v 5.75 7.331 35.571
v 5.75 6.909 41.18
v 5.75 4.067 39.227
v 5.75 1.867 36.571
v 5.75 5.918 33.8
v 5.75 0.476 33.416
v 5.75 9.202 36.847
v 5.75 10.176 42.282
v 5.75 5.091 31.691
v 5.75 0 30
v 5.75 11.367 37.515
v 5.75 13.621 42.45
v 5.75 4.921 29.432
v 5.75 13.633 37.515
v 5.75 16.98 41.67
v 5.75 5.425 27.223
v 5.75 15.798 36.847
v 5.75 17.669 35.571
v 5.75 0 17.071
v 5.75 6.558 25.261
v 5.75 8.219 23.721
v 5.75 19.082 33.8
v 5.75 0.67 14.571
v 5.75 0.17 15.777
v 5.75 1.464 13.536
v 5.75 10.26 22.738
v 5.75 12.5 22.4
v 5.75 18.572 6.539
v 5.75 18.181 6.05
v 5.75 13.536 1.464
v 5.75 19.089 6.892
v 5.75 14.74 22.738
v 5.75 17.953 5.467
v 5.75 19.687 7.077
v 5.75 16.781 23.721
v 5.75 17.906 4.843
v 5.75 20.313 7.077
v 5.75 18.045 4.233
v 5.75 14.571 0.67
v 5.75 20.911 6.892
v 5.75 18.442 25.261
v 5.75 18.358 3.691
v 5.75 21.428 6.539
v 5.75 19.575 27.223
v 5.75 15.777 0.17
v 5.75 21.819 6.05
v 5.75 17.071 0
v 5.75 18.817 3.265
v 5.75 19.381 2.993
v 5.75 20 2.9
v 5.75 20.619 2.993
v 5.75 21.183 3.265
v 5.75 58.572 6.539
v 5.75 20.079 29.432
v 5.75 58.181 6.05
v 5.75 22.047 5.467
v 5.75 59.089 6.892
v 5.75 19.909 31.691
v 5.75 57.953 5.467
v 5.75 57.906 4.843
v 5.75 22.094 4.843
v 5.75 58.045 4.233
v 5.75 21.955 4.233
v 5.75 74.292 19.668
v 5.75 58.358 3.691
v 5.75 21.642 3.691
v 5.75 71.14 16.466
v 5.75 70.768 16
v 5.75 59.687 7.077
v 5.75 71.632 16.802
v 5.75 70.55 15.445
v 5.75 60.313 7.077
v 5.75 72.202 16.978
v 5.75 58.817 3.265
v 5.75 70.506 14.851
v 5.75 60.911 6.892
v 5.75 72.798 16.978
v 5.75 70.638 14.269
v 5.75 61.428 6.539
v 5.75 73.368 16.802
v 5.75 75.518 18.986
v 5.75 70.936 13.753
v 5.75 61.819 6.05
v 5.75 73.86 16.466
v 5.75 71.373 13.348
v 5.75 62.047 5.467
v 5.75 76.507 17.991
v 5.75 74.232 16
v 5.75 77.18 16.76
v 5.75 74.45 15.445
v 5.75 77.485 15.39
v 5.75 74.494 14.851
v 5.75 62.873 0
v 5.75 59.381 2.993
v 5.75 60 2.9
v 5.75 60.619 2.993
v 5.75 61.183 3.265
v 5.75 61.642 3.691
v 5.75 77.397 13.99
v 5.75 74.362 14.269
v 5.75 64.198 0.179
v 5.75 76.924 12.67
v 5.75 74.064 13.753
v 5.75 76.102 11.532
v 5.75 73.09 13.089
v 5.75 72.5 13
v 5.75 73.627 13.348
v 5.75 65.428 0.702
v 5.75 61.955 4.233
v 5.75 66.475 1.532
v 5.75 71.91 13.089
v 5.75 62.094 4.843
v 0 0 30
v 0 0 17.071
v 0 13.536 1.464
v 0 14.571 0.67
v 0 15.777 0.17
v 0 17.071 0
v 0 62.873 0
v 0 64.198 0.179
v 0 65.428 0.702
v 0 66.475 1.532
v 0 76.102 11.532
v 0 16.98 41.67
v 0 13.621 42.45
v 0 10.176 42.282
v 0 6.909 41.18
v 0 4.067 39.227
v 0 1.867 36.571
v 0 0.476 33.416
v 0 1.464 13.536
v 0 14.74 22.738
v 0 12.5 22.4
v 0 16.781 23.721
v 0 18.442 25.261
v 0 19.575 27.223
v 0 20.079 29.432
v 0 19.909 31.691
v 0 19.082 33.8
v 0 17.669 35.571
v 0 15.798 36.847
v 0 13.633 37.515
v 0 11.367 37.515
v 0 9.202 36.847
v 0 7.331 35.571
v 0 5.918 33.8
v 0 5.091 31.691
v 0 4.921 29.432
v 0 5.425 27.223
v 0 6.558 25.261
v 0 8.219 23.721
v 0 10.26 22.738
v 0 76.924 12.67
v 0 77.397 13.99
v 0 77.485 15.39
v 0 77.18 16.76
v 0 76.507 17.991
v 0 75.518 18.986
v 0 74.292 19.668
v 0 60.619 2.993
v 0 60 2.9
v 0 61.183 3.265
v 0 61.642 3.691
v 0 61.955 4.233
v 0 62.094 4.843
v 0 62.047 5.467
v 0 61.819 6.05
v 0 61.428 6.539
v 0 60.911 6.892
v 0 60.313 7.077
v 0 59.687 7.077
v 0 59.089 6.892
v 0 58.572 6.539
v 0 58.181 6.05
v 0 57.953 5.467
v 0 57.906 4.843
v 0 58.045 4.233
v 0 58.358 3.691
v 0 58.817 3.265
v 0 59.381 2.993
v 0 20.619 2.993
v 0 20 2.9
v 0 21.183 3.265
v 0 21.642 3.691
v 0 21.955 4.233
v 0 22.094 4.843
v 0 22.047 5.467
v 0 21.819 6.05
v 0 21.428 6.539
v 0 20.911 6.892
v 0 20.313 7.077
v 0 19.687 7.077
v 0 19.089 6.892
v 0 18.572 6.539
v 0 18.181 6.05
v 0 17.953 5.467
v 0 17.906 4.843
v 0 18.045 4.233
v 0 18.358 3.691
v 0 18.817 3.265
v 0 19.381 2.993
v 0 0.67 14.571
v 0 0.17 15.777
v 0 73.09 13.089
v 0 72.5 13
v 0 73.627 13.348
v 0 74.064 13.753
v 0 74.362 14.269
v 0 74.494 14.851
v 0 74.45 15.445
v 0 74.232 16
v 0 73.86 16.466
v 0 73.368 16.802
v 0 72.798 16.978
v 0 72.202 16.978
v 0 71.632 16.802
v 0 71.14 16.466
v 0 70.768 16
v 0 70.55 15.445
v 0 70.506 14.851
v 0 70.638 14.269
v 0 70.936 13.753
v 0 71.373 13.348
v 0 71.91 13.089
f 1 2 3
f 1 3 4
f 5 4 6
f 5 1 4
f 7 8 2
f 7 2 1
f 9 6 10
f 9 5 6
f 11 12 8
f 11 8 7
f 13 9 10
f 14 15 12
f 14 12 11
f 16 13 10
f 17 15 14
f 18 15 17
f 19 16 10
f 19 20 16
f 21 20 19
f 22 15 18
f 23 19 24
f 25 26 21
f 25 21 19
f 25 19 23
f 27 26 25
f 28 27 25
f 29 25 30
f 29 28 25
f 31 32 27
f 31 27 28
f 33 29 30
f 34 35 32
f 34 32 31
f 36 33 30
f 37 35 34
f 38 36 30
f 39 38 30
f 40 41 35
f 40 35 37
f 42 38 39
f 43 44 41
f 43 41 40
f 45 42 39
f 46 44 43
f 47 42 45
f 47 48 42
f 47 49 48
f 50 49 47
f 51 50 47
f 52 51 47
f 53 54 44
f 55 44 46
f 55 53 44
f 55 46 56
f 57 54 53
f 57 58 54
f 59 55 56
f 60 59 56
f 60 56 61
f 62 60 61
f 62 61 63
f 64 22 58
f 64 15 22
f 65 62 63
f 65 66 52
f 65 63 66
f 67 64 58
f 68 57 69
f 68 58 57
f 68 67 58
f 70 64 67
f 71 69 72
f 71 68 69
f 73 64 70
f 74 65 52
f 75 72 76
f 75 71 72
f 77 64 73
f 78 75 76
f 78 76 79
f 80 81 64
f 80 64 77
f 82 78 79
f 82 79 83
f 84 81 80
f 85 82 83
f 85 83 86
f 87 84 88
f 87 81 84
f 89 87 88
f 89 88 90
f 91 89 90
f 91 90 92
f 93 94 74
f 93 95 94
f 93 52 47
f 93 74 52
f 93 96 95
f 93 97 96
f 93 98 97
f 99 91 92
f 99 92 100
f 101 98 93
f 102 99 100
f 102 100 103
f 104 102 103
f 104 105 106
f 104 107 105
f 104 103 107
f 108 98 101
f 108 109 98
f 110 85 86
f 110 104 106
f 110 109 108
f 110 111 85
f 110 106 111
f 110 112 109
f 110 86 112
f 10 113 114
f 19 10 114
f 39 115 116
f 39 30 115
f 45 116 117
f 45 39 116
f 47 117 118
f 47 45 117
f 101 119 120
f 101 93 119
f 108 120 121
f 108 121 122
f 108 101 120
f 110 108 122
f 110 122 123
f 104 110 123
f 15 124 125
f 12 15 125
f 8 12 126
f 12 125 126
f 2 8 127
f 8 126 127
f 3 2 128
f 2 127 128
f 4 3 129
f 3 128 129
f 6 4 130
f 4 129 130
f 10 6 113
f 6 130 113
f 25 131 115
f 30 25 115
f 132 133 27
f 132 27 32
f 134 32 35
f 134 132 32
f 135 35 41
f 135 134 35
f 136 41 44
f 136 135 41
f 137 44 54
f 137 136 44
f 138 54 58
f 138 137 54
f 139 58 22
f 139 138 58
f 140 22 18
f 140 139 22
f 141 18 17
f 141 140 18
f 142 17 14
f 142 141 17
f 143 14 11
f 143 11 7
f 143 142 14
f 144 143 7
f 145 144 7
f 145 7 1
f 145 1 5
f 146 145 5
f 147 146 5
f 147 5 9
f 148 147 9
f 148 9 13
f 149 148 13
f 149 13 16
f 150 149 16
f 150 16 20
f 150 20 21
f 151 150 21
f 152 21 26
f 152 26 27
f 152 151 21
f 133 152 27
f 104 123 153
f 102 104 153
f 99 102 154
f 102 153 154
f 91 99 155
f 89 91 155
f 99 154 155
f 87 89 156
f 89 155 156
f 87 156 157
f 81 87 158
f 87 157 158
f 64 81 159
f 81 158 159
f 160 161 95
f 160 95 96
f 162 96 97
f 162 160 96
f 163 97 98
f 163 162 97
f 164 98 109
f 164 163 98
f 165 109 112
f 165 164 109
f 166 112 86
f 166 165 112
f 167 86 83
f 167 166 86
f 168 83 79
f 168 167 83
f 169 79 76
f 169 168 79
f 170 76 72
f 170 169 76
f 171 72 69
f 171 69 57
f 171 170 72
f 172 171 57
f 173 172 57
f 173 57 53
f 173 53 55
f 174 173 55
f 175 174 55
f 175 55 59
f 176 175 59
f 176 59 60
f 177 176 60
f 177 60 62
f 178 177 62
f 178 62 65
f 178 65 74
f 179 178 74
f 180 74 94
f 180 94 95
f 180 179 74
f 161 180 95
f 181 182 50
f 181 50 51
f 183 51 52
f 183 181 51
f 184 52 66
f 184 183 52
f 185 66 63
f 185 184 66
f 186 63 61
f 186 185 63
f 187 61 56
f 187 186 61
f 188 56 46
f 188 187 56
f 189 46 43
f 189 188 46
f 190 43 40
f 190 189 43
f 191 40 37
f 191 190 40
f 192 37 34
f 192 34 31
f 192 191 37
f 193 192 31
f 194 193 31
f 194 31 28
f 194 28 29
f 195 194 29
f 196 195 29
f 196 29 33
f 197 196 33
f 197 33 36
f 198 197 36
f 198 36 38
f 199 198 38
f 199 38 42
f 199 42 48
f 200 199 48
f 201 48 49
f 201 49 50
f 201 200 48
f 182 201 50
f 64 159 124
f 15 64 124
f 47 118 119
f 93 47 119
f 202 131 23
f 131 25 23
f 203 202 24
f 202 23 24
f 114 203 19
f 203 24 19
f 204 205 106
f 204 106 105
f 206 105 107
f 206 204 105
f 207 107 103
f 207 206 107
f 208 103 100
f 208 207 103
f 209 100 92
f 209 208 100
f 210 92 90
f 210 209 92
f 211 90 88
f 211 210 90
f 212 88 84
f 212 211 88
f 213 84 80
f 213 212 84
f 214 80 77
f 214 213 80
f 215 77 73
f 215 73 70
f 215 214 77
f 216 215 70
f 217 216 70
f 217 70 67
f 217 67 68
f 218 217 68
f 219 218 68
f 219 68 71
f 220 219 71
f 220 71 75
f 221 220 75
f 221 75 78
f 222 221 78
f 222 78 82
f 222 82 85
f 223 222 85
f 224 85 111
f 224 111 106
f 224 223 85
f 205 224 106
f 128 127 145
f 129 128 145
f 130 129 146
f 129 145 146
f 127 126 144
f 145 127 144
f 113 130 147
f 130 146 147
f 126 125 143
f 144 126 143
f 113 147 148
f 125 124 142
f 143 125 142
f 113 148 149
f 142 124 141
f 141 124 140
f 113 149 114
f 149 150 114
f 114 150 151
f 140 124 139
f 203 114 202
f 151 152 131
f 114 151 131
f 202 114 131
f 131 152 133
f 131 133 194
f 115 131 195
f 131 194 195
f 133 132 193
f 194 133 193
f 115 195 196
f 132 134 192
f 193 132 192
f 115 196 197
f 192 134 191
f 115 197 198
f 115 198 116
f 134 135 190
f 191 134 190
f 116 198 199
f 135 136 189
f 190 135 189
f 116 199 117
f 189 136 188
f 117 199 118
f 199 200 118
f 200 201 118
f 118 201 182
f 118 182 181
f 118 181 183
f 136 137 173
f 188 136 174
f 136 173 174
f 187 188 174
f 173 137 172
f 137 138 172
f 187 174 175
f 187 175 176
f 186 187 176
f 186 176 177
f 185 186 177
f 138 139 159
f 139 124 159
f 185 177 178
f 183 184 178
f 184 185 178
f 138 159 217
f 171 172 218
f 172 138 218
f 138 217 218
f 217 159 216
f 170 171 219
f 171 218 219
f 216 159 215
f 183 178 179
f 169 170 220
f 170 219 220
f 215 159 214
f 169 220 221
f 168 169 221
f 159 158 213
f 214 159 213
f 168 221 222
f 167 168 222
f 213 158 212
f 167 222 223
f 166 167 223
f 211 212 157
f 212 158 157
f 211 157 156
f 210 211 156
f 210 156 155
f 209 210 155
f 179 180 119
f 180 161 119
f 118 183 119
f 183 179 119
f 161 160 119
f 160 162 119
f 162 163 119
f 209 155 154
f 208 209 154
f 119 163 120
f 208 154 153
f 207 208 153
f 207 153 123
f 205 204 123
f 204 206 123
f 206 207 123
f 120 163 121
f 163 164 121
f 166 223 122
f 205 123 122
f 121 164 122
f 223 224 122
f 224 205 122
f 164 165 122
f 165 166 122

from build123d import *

# Parameters (mm, degrees)
SKETCH_1_R      = 7.6
SKETCH_1_R_2    = 2.1
SKETCH_1_R_3    = 2
EXTRUDE_1_DEPTH = 5.75
FILLET_1_R      = 5


with BuildPart() as part:
    # ｽｹｯﾁ1 → ﾎﾞｽ - 押し出し1 (new body)
    with BuildSketch(Plane(origin=(0, 0, 0), x_dir=(0, 0, -1), z_dir=(1, 0, 0))):
        with BuildLine():
            Line((-15, 0), (0, 15))
            Line((0, 15), (0, 65))
            Line((0, 65), (-11.532291921, 76.102082825))
            ThreePointArc((-11.532291921, 76.102082825), (-16.085919318, 77.380653566), (-19.667854572, 74.291963643))
            Line((-19.667854572, 74.291963643), (-41.669636429, 16.979909107))
            ThreePointArc((-41.669636429, 16.979909107), (-40.301671317, 5.420058752), (-30, 0))
            Line((-30, 0), (-15, 0))
        make_face()
        with Locations((-30, 12.5)):
            Circle(SKETCH_1_R, mode=Mode.SUBTRACT)
        with Locations((-5, 20)):
            Circle(SKETCH_1_R_2, mode=Mode.SUBTRACT)
        with Locations((-5, 60)):
            Circle(SKETCH_1_R_2, mode=Mode.SUBTRACT)
        with Locations((-15, 72.5)):
            Circle(SKETCH_1_R_3, mode=Mode.SUBTRACT)
    extrude(amount=EXTRUDE_1_DEPTH)

    # ﾌｨﾚｯﾄ1
    fillet_1_edges = [part.edges().sort_by_distance(p)[0] for p in [
        (2.875, 65, 0),
        (2.875, 15, 0),
        (2.875, 0, 15),
    ]]
    fillet(fillet_1_edges, radius=FILLET_1_R)


solid = part.part
